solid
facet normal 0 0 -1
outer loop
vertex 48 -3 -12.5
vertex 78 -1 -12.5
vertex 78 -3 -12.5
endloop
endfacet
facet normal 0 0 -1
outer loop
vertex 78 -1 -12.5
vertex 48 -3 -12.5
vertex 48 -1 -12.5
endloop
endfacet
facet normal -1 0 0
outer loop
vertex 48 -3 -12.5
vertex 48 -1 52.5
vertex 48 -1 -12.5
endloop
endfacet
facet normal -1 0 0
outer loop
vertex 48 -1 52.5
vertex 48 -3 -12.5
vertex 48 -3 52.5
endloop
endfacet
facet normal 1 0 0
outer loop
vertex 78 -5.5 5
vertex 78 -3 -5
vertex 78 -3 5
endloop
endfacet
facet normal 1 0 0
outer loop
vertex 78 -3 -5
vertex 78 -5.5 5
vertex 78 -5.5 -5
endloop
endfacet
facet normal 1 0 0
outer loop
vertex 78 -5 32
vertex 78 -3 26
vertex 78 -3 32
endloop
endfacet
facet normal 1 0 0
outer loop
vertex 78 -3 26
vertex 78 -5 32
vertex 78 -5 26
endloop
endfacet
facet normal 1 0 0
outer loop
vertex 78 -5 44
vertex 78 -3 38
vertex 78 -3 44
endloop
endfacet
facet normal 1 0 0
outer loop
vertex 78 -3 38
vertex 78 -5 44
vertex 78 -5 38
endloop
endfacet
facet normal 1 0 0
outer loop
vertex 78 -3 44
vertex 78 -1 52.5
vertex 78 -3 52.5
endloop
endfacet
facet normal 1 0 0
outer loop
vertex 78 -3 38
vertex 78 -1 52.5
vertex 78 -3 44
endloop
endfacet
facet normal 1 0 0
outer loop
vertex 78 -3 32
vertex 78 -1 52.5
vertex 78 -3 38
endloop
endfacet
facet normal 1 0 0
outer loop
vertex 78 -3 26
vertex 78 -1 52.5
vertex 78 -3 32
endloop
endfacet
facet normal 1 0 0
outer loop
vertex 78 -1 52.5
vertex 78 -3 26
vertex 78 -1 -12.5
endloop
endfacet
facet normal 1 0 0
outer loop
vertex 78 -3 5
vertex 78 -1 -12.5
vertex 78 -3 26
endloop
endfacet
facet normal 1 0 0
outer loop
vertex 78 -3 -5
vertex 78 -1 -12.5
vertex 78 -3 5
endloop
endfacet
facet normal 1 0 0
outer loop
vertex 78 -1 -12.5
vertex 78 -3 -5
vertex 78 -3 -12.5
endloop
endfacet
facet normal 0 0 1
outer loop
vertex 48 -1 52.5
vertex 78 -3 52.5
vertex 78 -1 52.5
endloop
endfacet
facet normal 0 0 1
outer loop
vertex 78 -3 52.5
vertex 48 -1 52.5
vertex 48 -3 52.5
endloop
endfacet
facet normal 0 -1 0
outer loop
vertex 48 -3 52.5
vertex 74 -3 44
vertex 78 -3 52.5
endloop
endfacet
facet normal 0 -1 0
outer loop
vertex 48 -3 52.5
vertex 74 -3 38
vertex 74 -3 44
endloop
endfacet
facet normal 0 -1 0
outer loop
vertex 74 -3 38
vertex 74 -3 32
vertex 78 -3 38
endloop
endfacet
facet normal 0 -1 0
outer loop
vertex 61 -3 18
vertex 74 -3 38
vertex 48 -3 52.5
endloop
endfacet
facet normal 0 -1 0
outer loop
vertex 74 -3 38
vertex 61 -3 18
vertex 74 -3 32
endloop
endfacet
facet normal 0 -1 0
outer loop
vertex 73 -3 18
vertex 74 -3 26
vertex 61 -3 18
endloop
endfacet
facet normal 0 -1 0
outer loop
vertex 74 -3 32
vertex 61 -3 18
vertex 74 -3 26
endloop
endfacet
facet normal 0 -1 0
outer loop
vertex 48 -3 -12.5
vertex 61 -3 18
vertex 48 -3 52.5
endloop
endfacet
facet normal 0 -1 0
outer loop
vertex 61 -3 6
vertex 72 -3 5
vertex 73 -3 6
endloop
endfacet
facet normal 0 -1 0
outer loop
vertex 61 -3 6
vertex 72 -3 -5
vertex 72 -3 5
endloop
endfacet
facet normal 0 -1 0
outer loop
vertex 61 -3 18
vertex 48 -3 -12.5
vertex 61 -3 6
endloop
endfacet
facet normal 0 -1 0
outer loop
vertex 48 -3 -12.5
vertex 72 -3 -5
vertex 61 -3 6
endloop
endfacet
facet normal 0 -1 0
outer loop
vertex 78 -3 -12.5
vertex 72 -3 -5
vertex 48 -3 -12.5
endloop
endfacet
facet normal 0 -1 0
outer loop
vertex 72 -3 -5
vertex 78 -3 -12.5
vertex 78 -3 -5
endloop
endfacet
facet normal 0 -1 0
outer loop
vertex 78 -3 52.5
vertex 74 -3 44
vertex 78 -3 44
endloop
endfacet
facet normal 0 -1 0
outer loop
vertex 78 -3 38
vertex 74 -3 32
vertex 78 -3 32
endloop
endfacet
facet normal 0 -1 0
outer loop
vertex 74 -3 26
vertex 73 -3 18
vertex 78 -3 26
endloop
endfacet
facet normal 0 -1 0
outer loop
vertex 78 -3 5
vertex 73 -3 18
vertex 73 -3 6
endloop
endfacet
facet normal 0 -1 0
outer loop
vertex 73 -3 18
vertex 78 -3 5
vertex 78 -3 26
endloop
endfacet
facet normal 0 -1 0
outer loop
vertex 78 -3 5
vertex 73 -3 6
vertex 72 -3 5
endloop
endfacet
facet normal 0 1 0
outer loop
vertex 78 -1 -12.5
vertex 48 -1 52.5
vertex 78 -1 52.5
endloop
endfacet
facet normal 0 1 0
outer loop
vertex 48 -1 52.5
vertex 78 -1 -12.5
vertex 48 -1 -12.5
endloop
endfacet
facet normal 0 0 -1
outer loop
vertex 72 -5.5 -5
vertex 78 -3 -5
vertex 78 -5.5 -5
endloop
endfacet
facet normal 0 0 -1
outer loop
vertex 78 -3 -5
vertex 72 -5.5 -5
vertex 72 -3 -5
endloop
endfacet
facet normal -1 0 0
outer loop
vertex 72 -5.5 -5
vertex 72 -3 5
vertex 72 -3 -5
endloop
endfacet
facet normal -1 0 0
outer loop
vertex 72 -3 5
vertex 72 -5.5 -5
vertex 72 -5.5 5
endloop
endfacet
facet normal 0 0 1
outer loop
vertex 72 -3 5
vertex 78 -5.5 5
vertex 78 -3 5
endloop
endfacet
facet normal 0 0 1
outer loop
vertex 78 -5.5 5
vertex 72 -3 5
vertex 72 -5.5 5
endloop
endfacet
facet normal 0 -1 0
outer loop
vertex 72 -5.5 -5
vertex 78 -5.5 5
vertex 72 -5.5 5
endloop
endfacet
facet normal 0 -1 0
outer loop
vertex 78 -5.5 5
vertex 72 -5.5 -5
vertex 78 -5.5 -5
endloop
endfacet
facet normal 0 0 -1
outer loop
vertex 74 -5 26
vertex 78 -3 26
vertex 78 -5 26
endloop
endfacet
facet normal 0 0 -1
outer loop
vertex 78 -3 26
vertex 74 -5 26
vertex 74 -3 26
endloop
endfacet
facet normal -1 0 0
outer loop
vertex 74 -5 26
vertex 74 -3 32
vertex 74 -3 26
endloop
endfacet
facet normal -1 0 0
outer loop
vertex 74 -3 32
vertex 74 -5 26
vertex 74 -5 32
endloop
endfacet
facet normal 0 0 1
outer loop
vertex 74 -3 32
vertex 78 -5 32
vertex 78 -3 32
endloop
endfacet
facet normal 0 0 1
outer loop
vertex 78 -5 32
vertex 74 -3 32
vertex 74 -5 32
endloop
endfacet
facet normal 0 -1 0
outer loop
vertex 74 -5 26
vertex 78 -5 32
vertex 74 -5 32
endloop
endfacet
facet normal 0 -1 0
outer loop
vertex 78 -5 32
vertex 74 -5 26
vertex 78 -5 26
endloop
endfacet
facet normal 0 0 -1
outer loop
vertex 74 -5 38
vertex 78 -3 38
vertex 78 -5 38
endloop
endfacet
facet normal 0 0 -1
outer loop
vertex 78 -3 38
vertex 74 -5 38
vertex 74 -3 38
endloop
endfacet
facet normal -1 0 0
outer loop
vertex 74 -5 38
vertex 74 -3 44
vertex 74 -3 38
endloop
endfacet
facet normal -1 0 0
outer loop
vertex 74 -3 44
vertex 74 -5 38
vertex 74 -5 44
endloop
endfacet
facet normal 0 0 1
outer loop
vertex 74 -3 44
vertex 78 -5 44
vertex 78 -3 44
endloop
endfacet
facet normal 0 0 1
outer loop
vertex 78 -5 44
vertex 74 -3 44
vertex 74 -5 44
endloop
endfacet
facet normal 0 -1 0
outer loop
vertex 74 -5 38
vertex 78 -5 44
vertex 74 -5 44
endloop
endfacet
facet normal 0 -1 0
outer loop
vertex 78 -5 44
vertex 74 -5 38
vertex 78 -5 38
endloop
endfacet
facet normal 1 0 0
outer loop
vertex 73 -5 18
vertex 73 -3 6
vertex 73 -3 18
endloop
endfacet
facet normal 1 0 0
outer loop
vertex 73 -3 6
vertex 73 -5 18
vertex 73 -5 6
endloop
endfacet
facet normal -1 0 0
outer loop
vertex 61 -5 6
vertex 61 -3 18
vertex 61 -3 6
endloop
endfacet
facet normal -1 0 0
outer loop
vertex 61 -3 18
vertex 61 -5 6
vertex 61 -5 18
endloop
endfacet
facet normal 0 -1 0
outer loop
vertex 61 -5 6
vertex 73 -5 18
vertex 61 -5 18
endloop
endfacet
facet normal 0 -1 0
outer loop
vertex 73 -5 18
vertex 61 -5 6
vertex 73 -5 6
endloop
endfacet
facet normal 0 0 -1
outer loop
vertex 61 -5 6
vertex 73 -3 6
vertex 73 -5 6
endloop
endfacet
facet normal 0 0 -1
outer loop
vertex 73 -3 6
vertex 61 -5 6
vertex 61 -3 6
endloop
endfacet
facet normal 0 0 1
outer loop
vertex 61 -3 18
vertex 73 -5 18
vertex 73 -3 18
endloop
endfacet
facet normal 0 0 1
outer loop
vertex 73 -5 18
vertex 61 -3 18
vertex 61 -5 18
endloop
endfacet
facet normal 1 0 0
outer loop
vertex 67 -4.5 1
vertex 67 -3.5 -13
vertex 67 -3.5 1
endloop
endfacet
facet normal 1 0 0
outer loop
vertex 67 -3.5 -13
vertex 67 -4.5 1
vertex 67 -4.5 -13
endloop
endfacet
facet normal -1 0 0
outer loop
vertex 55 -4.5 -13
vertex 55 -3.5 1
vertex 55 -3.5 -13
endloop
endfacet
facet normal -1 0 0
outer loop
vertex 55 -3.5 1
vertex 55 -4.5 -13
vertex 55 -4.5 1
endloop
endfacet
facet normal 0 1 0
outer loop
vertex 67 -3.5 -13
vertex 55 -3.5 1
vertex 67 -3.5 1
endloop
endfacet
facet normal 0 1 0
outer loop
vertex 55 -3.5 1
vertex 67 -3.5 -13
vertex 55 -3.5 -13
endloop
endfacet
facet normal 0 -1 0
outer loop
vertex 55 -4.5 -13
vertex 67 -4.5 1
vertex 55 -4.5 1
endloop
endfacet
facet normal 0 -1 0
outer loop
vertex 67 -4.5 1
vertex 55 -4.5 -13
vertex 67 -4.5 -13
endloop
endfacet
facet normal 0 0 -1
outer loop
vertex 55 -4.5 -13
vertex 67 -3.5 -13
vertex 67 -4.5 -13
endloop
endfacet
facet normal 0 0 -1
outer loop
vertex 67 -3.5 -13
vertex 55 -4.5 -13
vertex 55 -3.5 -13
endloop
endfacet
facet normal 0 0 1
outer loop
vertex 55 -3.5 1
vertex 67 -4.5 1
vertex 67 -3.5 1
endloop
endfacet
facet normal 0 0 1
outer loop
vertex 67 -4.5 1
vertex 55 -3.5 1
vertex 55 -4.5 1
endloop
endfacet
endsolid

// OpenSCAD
// 70% keyboard case // Keyboard PCB // Pizero W

Akeys=[153,15,381];
Apcb=[153,2,381];
Acase=[157,15,386];
Apizero=[65,2,30];

module case() {
    difference(){
        cube(case, center=true);
        translate([0,1,0]){
            cube(Akeys, center=true);
        }
    }
}

module pi_sd() {
    translate([-60,4,-26]){
        rotate([90,0,0]){
            cube([12,14,1], center=true);
        }
    }
}

module pi_cpu() {
    translate([-66,4,-8]){
        rotate([90,0,0]){
            cube([12,12,2], center=true);
        }
    }
}

module usb_power() {
    translate([-75,4,21]){
        rotate([0,90,0]){
            cube([6,2,4], center=true);
        }
    }
}

module micro_usb() {
    translate([-75,4,9]){
        rotate([0,90,0]){
            cube([6,2,4], center=true);
        }
    }
}

module hdmi() {
    translate([-74,4,-20]){
        rotate([0,90,0]){
            cube([10,3,6], center=true);
        }
    }
}

module pizero_pcb() {
    translate([-62,2,0]){
        rotate([0,90,0]){
            cube(Apizero, center=true);
        }
    }
}

module PCB() {
    translate([0,0,0]){
        rotate([0,180,0]){
            cube(Apcb, center=true);
        }
    }
}

module pizero() {
    translate([1,0,20]){
        rotate([180,180,0]){
            pizero_pcb();
            hdmi();
            micro_usb();
            usb_power();
            pi_cpu();
            pi_sd();
        }
    }
}

pizero();
//case();
//PCB();
